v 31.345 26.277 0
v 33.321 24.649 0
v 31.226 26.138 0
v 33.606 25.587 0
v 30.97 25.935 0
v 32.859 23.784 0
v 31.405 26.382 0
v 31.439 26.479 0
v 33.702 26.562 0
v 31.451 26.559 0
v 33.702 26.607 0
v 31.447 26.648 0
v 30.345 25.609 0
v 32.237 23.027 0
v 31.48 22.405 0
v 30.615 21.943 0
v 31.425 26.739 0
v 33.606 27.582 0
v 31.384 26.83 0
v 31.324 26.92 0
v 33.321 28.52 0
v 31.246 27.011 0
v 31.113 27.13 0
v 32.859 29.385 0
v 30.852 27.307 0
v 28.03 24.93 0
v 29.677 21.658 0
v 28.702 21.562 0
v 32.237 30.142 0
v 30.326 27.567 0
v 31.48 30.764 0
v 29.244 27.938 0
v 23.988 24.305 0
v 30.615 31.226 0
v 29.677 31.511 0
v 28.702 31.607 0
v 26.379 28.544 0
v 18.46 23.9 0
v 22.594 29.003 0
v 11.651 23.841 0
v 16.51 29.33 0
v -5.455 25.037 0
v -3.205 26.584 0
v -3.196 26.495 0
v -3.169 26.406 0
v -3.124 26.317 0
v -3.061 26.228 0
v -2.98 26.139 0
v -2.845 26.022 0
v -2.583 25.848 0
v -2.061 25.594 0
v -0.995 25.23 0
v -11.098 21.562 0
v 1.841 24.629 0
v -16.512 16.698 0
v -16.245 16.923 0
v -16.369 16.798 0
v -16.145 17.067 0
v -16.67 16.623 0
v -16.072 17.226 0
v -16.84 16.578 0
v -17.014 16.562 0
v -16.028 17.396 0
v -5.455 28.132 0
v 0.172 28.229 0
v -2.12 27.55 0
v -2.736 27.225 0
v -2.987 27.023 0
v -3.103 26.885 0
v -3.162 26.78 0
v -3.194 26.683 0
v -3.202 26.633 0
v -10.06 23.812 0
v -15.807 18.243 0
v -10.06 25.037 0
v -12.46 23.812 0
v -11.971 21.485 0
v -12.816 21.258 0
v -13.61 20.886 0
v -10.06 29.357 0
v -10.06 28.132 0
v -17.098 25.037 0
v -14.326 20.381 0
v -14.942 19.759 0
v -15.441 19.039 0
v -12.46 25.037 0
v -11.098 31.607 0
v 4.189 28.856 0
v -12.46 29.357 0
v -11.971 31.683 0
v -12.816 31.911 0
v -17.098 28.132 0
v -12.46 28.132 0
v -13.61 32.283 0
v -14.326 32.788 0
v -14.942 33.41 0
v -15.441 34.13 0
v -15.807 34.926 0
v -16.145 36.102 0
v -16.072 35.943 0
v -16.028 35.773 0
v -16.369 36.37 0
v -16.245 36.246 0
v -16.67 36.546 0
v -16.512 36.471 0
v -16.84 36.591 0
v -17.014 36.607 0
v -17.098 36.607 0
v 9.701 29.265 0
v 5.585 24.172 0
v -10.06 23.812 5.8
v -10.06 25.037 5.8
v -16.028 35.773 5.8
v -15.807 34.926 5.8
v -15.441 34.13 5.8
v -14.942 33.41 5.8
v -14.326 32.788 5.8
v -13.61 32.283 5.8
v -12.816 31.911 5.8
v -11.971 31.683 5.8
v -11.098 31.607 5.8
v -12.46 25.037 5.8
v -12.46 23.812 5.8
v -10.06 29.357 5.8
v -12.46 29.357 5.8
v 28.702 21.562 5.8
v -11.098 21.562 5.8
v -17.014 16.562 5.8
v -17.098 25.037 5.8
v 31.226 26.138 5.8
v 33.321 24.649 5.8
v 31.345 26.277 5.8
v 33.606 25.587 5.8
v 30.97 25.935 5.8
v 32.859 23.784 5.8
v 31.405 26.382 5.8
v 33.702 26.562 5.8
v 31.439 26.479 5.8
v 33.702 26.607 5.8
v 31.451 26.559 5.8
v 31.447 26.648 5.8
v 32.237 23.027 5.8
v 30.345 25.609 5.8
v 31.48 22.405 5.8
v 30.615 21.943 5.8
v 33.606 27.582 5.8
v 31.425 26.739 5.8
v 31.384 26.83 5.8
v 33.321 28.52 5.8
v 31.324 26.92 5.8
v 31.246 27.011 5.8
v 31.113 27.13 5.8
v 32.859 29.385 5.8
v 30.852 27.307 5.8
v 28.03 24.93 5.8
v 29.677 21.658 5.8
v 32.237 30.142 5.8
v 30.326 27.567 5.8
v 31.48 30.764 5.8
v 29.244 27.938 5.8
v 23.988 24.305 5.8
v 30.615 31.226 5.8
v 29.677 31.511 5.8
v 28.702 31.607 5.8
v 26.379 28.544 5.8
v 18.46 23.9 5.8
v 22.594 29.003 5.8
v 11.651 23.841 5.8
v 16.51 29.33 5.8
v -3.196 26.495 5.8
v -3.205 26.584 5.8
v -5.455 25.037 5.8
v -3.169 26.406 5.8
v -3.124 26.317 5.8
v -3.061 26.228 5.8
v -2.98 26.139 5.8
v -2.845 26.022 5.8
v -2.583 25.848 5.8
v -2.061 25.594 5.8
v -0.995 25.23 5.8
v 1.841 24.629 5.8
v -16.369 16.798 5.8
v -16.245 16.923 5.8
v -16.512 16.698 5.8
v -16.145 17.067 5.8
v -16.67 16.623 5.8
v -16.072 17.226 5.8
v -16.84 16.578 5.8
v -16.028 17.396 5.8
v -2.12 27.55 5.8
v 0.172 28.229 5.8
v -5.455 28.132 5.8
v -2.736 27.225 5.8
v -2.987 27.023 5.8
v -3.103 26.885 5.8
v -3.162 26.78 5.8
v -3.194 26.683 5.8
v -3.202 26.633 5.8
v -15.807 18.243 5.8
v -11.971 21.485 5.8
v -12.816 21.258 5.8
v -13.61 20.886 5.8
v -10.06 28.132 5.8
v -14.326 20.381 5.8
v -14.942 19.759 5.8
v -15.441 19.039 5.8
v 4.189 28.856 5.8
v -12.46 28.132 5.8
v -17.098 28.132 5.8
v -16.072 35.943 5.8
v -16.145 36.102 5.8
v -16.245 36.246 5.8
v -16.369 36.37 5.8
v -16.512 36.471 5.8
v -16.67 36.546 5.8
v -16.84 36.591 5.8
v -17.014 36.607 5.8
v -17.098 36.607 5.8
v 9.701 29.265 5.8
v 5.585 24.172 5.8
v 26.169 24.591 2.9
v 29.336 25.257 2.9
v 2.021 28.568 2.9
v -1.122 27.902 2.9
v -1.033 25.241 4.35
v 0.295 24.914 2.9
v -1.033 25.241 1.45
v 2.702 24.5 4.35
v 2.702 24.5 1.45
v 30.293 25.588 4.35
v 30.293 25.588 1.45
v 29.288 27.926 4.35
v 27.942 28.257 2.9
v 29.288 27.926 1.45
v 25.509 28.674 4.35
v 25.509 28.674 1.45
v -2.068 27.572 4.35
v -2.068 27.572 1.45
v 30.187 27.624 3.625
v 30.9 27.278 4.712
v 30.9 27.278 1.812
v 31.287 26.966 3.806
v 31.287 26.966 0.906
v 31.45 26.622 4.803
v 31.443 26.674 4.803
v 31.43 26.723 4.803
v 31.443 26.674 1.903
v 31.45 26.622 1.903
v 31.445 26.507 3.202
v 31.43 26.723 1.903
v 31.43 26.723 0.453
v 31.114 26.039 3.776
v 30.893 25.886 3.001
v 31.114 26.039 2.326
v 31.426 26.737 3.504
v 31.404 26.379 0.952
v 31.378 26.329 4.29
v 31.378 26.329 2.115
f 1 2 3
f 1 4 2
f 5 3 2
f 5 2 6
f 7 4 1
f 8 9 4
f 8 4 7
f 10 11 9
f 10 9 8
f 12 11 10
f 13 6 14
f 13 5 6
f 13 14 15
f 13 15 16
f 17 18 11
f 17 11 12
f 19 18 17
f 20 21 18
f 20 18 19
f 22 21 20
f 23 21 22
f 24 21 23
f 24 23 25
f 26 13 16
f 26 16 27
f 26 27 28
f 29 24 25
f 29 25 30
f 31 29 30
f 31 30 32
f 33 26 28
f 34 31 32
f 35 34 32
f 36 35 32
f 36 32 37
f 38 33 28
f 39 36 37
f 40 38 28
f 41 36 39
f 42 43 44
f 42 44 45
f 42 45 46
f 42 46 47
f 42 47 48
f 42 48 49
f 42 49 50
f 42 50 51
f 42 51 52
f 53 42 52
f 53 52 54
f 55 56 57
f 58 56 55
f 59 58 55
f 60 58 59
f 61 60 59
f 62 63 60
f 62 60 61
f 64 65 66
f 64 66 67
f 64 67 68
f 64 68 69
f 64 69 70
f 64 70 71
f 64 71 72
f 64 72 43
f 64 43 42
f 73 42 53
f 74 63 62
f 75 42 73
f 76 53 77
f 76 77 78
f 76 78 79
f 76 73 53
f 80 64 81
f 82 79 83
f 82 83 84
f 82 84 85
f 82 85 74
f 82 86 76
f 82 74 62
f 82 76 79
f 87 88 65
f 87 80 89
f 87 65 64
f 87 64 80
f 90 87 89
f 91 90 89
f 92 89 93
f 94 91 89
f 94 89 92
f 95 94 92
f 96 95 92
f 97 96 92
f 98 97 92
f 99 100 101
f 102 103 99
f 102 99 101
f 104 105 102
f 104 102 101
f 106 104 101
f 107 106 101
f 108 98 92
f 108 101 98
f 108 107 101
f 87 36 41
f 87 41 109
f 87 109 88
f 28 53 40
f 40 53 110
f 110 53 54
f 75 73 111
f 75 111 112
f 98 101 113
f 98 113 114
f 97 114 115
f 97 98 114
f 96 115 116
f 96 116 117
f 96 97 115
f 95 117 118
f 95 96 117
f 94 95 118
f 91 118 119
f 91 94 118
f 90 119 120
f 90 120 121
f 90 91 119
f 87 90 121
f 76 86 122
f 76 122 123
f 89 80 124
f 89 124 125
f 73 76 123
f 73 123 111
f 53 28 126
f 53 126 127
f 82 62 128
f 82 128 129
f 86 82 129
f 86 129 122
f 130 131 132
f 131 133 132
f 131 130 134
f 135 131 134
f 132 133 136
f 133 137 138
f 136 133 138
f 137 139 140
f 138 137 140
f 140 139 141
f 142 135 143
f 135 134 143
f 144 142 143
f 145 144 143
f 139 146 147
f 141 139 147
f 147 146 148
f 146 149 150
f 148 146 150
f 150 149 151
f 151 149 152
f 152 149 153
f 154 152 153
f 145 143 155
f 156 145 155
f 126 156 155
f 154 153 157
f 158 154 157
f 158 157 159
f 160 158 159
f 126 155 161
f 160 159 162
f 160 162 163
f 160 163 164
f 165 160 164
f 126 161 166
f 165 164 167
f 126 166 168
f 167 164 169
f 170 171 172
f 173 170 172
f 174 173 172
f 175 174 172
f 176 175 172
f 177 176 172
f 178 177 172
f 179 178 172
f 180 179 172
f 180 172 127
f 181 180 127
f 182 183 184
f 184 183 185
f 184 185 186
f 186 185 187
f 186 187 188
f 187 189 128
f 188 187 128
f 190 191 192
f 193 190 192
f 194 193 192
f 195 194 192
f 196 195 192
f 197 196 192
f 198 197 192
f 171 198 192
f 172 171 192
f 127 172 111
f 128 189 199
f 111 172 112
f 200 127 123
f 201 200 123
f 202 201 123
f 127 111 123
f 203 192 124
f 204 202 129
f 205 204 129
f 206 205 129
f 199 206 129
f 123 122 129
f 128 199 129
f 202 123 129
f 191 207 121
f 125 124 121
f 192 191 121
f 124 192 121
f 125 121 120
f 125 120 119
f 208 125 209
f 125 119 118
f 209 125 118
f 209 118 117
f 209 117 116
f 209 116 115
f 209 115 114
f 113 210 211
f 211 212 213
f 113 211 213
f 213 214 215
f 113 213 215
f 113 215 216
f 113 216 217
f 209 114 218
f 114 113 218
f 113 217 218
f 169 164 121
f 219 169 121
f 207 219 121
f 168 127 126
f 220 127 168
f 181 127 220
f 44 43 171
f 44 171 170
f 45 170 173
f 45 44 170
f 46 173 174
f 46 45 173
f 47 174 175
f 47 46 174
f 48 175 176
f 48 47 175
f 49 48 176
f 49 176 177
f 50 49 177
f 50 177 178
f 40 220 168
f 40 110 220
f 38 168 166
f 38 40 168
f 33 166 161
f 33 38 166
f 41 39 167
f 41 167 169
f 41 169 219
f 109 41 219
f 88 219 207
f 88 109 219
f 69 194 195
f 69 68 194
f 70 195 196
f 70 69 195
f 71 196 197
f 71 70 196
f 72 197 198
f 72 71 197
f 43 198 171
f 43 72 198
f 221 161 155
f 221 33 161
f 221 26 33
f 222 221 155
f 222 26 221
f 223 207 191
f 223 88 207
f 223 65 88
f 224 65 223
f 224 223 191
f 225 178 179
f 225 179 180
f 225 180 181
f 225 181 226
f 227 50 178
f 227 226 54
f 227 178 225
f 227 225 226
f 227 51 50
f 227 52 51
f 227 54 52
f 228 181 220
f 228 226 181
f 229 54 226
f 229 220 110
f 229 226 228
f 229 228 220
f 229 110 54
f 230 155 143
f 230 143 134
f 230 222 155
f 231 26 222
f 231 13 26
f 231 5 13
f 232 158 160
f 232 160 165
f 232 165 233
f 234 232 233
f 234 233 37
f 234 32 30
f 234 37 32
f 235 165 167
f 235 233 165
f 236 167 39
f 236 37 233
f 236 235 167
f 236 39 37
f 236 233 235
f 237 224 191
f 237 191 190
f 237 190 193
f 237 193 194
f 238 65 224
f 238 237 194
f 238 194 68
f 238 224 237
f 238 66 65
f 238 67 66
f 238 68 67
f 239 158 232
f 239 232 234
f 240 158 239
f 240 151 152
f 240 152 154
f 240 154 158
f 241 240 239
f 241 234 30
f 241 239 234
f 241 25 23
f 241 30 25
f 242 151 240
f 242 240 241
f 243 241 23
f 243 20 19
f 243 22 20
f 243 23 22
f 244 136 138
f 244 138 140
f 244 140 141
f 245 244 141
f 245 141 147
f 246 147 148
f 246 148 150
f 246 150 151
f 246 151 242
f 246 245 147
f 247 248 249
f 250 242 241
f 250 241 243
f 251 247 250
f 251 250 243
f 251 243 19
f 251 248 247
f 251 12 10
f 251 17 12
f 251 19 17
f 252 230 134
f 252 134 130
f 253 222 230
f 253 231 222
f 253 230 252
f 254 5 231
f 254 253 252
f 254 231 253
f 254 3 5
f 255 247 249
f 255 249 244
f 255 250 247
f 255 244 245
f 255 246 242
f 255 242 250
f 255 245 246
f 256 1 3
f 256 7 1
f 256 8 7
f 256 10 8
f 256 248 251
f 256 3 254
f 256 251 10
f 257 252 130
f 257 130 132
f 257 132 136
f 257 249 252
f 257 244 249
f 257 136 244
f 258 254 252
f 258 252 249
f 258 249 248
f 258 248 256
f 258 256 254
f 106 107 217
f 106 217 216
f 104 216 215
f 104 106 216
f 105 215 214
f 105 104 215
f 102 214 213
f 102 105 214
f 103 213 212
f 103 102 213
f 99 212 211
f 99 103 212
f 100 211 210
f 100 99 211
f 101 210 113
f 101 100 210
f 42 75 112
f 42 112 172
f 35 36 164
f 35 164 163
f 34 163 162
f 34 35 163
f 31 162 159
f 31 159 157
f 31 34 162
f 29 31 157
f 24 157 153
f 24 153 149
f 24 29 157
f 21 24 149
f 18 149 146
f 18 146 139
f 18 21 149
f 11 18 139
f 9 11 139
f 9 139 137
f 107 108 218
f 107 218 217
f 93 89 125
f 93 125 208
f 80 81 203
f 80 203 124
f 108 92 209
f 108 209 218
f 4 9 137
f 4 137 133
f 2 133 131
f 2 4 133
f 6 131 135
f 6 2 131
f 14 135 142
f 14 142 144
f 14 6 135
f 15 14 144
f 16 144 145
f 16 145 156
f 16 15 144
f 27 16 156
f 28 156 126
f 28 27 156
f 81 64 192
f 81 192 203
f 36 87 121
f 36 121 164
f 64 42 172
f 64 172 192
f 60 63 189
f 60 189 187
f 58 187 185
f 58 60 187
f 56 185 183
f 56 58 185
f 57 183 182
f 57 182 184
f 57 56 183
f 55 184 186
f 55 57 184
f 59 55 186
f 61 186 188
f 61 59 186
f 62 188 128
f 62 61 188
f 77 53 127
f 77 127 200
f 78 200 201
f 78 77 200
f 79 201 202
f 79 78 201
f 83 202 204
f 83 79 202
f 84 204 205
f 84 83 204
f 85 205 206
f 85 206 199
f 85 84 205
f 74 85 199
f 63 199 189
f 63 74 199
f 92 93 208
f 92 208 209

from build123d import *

# Parameters (mm, degrees)
SKETCH1_RX          = 17.328454948
SKETCH1_RY          = 2.772242018
BOSS_EXTRUDE1_DEPTH = 5.8


with BuildPart() as part:
    # Sketch1 → Boss-Extrude1 (new body)
    with BuildSketch(Plane.XY):
        with BuildLine():
            Line((-10.059850626, 29.356682147), (-12.459850626, 29.356682147))
            Line((-12.459850626, 29.356682147), (-12.459850626, 28.132280135))
            Line((-12.459850626, 28.132280135), (-17.098055654, 28.132280135))
            Line((-17.098055654, 28.132280135), (-17.098055654, 36.606682147))
            Line((-17.098055654, 36.606682147), (-17.014135437, 36.606682147))
            ThreePointArc((-17.014135437, 36.606682147), (-16.368638213, 36.370444763), (-16.02812214, 35.773348814))
            ThreePointArc((-16.02812214, 35.773348814), (-14.325541776, 32.787869068), (-11.098055654, 31.606682147))
            Line((-11.098055654, 31.606682147), (28.701944346, 31.606682147))
            ThreePointArc((28.701944346, 31.606682147), (32.237478252, 30.142216053), (33.701944346, 26.606682147))
            Line((33.701944346, 26.606682147), (33.701944346, 26.562198111))
            ThreePointArc((33.701944346, 26.562198111), (32.237478252, 23.026664205), (28.701944346, 21.562198111))
            Line((28.701944346, 21.562198111), (-11.098055654, 21.562198111))
            ThreePointArc((-11.098055654, 21.562198111), (-14.325541776, 20.38101119), (-16.02812214, 17.395531445))
            ThreePointArc((-16.02812214, 17.395531445), (-16.368638213, 16.798435495), (-17.014135437, 16.562198111))
            Line((-17.014135437, 16.562198111), (-17.098055654, 25.036600123))
            Line((-17.098055654, 25.036600123), (-12.459850626, 25.036600123))
            Line((-12.459850626, 25.036600123), (-12.459850626, 23.812198111))
            Line((-12.459850626, 23.812198111), (-10.059850626, 23.812198111))
            Line((-10.059850626, 23.812198111), (-10.059850626, 25.036600123))
            Line((-10.059850626, 25.036600123), (-5.45496555, 25.036600123))
            Line((-5.45496555, 25.036600123), (-5.45496555, 28.132280135))
            Line((-5.45496555, 28.132280135), (-10.059850626, 28.132280135))
            Line((-10.059850626, 28.132280135), (-10.059850626, 29.356682147))
        make_face()
        with Locations(Location((14.123489398, 26.584440129), (0, 0, -180))):
            Ellipse(SKETCH1_RX, SKETCH1_RY, mode=Mode.SUBTRACT)
    extrude(amount=BOSS_EXTRUDE1_DEPTH)


solid = part.part
